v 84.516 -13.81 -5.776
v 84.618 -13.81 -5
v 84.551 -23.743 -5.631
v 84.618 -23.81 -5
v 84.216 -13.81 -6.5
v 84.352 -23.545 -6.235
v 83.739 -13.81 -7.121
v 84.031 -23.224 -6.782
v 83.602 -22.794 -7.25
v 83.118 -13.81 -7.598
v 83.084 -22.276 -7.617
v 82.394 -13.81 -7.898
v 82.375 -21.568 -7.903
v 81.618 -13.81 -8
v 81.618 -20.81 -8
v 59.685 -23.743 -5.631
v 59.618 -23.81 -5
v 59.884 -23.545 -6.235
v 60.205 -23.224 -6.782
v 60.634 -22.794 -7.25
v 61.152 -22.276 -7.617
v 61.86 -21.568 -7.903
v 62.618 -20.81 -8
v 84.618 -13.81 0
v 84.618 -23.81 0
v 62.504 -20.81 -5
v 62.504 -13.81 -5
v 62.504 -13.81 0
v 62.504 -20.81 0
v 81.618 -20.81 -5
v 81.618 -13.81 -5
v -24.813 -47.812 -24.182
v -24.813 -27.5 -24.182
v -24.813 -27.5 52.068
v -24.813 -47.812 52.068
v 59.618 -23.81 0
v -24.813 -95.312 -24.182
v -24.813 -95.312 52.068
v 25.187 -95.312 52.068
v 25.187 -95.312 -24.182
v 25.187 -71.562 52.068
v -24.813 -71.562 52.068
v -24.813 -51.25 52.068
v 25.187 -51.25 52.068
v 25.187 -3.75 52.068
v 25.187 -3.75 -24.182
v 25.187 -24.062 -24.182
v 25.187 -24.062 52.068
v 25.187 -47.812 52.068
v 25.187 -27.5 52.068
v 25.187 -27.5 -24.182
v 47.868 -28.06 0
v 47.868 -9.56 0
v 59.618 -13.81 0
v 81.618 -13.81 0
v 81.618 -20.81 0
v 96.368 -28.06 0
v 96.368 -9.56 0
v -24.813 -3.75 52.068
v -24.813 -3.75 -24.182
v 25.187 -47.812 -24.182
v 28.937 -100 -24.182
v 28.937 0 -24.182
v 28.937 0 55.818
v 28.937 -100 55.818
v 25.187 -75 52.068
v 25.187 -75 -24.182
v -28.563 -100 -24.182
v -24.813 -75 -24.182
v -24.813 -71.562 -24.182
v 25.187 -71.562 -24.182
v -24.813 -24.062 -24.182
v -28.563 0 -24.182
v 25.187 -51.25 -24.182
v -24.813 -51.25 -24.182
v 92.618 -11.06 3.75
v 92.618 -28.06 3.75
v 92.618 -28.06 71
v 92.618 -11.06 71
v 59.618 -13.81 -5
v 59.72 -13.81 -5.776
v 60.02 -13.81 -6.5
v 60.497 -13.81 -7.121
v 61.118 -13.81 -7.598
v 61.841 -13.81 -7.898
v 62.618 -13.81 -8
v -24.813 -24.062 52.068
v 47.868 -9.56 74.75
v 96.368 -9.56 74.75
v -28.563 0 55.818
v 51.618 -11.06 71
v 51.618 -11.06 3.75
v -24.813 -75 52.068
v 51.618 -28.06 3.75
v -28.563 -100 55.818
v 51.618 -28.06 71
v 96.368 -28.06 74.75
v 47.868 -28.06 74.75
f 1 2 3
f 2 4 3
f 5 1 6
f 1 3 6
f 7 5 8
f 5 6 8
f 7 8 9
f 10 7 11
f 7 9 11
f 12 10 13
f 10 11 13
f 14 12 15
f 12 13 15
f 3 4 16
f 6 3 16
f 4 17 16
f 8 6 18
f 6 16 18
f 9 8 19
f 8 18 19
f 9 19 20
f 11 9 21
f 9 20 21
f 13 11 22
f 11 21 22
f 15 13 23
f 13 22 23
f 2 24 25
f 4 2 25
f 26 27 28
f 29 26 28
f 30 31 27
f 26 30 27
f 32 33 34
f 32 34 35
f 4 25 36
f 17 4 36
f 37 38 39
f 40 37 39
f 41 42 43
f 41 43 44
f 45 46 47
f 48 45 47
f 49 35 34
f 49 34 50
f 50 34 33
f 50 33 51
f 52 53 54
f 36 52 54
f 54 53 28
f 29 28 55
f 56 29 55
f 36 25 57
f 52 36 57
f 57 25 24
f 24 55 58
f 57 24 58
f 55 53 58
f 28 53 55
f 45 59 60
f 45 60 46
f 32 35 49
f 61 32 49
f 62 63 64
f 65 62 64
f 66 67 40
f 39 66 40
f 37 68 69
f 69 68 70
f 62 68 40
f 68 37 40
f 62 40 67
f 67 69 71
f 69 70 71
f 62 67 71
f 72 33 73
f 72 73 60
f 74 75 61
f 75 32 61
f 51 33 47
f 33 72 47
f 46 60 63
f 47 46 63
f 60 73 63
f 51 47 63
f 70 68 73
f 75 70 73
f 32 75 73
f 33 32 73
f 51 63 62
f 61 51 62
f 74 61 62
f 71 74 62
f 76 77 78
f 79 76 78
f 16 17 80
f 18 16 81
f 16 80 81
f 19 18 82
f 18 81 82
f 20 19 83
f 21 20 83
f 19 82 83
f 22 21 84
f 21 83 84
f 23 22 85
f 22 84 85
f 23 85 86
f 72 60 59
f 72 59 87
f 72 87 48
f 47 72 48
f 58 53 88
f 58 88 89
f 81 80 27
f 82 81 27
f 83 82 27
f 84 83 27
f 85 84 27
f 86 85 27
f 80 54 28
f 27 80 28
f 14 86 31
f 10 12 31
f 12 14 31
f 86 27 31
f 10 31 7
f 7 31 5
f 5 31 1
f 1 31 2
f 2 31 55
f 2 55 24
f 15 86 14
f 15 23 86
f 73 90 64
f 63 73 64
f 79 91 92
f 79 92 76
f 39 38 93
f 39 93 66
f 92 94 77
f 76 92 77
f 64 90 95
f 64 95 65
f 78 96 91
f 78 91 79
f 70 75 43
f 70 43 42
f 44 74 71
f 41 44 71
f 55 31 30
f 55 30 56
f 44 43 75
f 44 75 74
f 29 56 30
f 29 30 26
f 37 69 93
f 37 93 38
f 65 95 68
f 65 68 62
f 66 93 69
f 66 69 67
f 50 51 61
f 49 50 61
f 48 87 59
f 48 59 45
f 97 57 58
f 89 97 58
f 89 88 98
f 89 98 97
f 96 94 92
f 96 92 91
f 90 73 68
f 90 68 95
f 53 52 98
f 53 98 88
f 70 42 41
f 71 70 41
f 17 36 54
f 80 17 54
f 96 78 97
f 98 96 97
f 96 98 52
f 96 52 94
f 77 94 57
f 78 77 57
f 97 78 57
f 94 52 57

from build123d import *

# Parameters (mm, degrees)
F0_W      = 57.5
F0_H      = 80
F1_DEPTH  = 100
F2_W      = 50
F2_H      = 20.3125
F3_DEPTH  = 76.25
F4_W      = 48.5
F4_H      = 18.5
F5_DEPTH  = 74.75
F6_W      = 12.5
F6_H      = 5
F7_DEPTH  = 8
F8_R      = 3
F9_W      = 19.114142
F9_H      = 5
F10_DEPTH = 7
F11_W     = 41
F11_H     = 67.25
F12_DEPTH = 17


with BuildPart() as f1:
    # F0 (on Front) → F1 (new body)
    with BuildSketch(Plane.XZ):
        with Locations((0.186592, 15.818478)):
            Rectangle(F0_W, F0_H)
    extrude(amount=F1_DEPTH)

    # F2 (on face) → F3 (cut)
    with BuildSketch(Plane(origin=(0, 0, -24.181522), x_dir=(1, 0, 0), z_dir=(0, 0, -1))):
        with Locations((0.186592, 13.90625)):
            Rectangle(F2_W, F2_H)
        with Locations((0.186592, 37.65625)):
            Rectangle(F2_W, F2_H)
        with Locations((0.186592, 61.40625)):
            Rectangle(F2_W, F2_H)
        with Locations((0.186592, 85.15625)):
            Rectangle(F2_W, F2_H)
    extrude(amount=-F3_DEPTH, mode=Mode.SUBTRACT)


with BuildPart() as f5:
    # F4 (on Top) → F5 (new body)
    with BuildSketch(Plane.XY):
        with Locations((72.117852, -18.810411)):
            Rectangle(F4_W, F4_H)
    extrude(amount=F5_DEPTH)

    # F6 (on face) → F7 (join)
    with BuildSketch(Plane(origin=(0, 0, 0), x_dir=(1, 0, 0), z_dir=(0, 0, -1))):
        with Locations((78.367852, 21.310411)):
            Rectangle(F6_W, F6_H)
        with Locations((65.867852, 21.310411)):
            Rectangle(F6_W, F6_H)
        with Locations((78.367852, 16.310411)):
            Rectangle(F6_W, F6_H)
        with Locations((65.867852, 16.310411)):
            Rectangle(F6_W, F6_H)
    extrude(amount=F7_DEPTH)

    # F8
    f8_edges = [f5.edges().sort_by_distance(p)[0] for p in [
        (72.117852, -23.810411, -8),
        (59.617852, -18.810411, -8),
        (84.617852, -18.810411, -8),
    ]]
    fillet(f8_edges, radius=F8_R)

    # F9 (on face) → F10 (cut)
    with BuildSketch(Plane(origin=(0, -13.810411, 0), x_dir=(-1, 0, 0), z_dir=(0, 1, 0))):
        with Locations((-72.060781, -2.5)):
            Rectangle(F9_W, F9_H)
    extrude(amount=-F10_DEPTH, mode=Mode.SUBTRACT)

    # F11 (on face) → F12 (cut)
    with BuildSketch(Plane.XZ.offset(28.060411)):
        with Locations((72.117852, 37.375)):
            Rectangle(F11_W, F11_H)
    extrude(amount=-F12_DEPTH, mode=Mode.SUBTRACT)


solid = Compound([f1.part, f5.part])
